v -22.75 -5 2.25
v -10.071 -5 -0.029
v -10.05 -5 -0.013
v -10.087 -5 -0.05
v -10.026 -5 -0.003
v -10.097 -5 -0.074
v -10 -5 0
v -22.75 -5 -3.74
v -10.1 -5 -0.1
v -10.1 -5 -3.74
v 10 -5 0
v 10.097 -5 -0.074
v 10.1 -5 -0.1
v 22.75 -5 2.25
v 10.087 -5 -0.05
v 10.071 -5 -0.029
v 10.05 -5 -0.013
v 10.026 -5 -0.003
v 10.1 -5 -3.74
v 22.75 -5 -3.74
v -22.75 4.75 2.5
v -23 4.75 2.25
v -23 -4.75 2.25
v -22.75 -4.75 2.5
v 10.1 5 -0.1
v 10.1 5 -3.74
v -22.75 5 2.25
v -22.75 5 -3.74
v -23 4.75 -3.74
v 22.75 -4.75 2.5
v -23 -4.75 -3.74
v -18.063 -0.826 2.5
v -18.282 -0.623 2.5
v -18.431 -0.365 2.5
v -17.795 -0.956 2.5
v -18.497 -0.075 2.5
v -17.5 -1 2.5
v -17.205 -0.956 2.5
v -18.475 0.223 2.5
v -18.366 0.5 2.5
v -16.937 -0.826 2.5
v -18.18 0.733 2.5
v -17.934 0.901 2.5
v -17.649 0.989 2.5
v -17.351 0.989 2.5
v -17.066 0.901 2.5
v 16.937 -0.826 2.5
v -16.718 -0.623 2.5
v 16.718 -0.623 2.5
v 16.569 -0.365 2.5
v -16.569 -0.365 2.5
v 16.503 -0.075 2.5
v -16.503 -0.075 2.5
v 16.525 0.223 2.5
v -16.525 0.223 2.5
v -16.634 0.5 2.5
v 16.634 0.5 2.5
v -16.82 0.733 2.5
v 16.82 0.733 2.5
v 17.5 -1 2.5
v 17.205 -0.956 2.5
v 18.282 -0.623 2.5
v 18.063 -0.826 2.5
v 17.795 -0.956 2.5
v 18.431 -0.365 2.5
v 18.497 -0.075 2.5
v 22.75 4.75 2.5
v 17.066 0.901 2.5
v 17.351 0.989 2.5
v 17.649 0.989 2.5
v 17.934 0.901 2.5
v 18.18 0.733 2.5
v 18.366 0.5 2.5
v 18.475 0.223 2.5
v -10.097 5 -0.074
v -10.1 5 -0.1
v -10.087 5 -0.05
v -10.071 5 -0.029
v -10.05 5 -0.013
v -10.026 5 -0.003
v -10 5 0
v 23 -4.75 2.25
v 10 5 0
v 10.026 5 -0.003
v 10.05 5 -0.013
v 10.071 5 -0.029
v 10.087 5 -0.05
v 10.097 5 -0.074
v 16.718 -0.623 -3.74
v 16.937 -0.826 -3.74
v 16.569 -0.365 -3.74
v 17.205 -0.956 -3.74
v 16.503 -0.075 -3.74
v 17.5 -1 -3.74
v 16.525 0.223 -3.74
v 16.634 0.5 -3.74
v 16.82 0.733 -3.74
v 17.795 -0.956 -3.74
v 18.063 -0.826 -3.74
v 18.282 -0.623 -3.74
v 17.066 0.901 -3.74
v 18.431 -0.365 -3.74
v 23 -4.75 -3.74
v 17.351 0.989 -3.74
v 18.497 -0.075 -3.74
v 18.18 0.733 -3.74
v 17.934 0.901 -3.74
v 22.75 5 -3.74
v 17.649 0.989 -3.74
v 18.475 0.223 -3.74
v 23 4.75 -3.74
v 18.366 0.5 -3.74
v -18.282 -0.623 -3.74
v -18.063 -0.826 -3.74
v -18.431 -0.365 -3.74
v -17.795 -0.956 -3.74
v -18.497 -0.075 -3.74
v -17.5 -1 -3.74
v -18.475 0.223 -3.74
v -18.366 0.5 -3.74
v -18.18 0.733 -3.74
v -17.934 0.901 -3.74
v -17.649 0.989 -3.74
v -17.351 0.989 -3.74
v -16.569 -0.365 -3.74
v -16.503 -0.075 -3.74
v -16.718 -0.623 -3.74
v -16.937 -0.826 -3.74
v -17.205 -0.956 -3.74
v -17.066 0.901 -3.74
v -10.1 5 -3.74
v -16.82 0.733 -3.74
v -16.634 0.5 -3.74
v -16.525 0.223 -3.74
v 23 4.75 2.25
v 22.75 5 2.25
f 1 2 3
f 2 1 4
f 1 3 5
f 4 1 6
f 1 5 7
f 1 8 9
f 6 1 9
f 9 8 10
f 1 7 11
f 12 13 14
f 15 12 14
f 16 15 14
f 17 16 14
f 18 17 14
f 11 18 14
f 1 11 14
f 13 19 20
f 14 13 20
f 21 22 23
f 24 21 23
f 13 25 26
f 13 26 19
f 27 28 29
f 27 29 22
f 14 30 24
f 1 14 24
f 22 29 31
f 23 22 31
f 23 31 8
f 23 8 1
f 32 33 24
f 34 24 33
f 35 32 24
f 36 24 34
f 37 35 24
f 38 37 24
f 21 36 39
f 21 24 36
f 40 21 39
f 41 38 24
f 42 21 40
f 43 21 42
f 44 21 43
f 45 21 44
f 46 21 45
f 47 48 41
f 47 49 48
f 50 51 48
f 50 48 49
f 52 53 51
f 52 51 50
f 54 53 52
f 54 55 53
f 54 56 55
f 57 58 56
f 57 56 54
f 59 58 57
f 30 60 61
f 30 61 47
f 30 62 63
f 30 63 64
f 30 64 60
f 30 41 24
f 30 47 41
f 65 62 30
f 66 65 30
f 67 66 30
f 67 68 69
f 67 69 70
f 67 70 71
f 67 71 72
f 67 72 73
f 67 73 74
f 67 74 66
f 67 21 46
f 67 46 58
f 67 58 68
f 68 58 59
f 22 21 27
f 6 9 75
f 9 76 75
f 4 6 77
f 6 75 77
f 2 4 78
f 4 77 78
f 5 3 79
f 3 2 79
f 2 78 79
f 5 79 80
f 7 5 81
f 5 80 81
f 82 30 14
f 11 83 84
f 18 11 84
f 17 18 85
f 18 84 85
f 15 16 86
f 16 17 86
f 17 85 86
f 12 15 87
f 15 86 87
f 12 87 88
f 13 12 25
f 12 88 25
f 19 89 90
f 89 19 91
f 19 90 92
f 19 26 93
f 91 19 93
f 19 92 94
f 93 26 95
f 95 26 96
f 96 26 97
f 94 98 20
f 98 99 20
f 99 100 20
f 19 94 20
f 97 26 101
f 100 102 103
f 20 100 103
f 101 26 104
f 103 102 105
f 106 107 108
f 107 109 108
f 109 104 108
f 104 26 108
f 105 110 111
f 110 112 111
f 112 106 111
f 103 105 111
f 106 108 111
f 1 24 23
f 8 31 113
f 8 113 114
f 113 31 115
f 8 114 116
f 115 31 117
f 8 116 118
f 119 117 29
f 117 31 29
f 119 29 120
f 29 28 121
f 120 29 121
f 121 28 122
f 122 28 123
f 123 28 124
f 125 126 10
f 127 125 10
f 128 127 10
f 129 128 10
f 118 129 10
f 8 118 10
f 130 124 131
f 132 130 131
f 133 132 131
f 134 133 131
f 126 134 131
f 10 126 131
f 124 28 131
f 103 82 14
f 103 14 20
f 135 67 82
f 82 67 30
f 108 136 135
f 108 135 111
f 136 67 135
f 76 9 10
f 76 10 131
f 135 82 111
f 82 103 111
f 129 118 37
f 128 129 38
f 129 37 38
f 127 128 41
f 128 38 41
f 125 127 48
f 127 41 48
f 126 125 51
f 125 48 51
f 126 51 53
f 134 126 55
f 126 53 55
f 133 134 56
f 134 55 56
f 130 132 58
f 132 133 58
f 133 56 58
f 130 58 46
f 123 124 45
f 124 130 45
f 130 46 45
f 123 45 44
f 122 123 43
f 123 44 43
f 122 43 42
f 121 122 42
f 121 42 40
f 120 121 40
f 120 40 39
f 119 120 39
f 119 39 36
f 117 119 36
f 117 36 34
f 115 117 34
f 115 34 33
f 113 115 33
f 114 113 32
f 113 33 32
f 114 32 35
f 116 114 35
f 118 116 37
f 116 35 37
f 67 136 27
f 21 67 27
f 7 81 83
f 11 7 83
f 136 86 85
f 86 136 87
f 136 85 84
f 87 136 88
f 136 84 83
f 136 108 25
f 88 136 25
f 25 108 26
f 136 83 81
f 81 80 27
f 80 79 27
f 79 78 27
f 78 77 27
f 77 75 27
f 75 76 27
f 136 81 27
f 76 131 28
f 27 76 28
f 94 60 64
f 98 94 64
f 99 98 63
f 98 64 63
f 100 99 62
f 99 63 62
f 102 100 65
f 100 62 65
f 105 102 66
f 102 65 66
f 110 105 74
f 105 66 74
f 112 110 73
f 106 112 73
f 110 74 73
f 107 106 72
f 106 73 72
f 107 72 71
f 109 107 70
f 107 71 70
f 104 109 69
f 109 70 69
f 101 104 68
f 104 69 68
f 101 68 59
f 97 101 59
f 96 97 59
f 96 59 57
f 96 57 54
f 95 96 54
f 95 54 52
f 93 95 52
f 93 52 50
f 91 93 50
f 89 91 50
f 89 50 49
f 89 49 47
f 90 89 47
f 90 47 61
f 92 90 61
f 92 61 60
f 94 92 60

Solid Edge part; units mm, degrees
sketch "Sketch1" plane through (0, 0, 0) normal (0, 0, 1) x (1, 0, 0)
  line L0 (-23, -5) -> (23, -5)
  line L1 (23, -5) -> (23, 5)
  line L2 (23, 5) -> (-23, 5)
  line L3 (-23, 5) -> (-23, -5)
  dimension "D1" = 10
  dimension "D2" = 46
extrude "Protrusion1" add sketch "Sketch1" along normal blind 2.5
sketch "Sketch2" plane through (0, 0, 0) normal (0, 0, -1) x (1, 0, 0)
  line L0 (-23, 5) -> (-10.1, 5)
  line L1 (-10.1, 5) -> (-10.1, -5)
  line L2 (-10.1, -5) -> (-23, -5)
  line L3 (-23, -5) -> (-23, 5)
  dimension "D1" = 10.1
extrude "Base_inferiore" add sketch "Sketch2" along normal blind 3.74
mirror "Mirror1" about plane through (0, 0, 0) normal (1, 0, 0) of "Base_inferiore"
hole "Foro_2" at (17.5, 0, 2.5) direction (0, 0, -1) diameter 2 end up to next
mirror "Mirror2" about plane through (0, 0, 0) normal (1, 0, 0) of "Foro_2"
fillet "Rotondo_1" radius 0.1 2 edges at (-10.1, 0, 0) (10.1, 0, 0)
chamfer "Smusso_1" distance 0.25 angle 45 8 edges at (0, -5, 2.5) (23, 0, 2.5) (0, 5, 2.5) (-23, 0, 2.5) (-23, -5, -0.62) (23, -5, -0.62) (23, 5, -0.62) (-23, 5, -0.62)
properties part number "001"
